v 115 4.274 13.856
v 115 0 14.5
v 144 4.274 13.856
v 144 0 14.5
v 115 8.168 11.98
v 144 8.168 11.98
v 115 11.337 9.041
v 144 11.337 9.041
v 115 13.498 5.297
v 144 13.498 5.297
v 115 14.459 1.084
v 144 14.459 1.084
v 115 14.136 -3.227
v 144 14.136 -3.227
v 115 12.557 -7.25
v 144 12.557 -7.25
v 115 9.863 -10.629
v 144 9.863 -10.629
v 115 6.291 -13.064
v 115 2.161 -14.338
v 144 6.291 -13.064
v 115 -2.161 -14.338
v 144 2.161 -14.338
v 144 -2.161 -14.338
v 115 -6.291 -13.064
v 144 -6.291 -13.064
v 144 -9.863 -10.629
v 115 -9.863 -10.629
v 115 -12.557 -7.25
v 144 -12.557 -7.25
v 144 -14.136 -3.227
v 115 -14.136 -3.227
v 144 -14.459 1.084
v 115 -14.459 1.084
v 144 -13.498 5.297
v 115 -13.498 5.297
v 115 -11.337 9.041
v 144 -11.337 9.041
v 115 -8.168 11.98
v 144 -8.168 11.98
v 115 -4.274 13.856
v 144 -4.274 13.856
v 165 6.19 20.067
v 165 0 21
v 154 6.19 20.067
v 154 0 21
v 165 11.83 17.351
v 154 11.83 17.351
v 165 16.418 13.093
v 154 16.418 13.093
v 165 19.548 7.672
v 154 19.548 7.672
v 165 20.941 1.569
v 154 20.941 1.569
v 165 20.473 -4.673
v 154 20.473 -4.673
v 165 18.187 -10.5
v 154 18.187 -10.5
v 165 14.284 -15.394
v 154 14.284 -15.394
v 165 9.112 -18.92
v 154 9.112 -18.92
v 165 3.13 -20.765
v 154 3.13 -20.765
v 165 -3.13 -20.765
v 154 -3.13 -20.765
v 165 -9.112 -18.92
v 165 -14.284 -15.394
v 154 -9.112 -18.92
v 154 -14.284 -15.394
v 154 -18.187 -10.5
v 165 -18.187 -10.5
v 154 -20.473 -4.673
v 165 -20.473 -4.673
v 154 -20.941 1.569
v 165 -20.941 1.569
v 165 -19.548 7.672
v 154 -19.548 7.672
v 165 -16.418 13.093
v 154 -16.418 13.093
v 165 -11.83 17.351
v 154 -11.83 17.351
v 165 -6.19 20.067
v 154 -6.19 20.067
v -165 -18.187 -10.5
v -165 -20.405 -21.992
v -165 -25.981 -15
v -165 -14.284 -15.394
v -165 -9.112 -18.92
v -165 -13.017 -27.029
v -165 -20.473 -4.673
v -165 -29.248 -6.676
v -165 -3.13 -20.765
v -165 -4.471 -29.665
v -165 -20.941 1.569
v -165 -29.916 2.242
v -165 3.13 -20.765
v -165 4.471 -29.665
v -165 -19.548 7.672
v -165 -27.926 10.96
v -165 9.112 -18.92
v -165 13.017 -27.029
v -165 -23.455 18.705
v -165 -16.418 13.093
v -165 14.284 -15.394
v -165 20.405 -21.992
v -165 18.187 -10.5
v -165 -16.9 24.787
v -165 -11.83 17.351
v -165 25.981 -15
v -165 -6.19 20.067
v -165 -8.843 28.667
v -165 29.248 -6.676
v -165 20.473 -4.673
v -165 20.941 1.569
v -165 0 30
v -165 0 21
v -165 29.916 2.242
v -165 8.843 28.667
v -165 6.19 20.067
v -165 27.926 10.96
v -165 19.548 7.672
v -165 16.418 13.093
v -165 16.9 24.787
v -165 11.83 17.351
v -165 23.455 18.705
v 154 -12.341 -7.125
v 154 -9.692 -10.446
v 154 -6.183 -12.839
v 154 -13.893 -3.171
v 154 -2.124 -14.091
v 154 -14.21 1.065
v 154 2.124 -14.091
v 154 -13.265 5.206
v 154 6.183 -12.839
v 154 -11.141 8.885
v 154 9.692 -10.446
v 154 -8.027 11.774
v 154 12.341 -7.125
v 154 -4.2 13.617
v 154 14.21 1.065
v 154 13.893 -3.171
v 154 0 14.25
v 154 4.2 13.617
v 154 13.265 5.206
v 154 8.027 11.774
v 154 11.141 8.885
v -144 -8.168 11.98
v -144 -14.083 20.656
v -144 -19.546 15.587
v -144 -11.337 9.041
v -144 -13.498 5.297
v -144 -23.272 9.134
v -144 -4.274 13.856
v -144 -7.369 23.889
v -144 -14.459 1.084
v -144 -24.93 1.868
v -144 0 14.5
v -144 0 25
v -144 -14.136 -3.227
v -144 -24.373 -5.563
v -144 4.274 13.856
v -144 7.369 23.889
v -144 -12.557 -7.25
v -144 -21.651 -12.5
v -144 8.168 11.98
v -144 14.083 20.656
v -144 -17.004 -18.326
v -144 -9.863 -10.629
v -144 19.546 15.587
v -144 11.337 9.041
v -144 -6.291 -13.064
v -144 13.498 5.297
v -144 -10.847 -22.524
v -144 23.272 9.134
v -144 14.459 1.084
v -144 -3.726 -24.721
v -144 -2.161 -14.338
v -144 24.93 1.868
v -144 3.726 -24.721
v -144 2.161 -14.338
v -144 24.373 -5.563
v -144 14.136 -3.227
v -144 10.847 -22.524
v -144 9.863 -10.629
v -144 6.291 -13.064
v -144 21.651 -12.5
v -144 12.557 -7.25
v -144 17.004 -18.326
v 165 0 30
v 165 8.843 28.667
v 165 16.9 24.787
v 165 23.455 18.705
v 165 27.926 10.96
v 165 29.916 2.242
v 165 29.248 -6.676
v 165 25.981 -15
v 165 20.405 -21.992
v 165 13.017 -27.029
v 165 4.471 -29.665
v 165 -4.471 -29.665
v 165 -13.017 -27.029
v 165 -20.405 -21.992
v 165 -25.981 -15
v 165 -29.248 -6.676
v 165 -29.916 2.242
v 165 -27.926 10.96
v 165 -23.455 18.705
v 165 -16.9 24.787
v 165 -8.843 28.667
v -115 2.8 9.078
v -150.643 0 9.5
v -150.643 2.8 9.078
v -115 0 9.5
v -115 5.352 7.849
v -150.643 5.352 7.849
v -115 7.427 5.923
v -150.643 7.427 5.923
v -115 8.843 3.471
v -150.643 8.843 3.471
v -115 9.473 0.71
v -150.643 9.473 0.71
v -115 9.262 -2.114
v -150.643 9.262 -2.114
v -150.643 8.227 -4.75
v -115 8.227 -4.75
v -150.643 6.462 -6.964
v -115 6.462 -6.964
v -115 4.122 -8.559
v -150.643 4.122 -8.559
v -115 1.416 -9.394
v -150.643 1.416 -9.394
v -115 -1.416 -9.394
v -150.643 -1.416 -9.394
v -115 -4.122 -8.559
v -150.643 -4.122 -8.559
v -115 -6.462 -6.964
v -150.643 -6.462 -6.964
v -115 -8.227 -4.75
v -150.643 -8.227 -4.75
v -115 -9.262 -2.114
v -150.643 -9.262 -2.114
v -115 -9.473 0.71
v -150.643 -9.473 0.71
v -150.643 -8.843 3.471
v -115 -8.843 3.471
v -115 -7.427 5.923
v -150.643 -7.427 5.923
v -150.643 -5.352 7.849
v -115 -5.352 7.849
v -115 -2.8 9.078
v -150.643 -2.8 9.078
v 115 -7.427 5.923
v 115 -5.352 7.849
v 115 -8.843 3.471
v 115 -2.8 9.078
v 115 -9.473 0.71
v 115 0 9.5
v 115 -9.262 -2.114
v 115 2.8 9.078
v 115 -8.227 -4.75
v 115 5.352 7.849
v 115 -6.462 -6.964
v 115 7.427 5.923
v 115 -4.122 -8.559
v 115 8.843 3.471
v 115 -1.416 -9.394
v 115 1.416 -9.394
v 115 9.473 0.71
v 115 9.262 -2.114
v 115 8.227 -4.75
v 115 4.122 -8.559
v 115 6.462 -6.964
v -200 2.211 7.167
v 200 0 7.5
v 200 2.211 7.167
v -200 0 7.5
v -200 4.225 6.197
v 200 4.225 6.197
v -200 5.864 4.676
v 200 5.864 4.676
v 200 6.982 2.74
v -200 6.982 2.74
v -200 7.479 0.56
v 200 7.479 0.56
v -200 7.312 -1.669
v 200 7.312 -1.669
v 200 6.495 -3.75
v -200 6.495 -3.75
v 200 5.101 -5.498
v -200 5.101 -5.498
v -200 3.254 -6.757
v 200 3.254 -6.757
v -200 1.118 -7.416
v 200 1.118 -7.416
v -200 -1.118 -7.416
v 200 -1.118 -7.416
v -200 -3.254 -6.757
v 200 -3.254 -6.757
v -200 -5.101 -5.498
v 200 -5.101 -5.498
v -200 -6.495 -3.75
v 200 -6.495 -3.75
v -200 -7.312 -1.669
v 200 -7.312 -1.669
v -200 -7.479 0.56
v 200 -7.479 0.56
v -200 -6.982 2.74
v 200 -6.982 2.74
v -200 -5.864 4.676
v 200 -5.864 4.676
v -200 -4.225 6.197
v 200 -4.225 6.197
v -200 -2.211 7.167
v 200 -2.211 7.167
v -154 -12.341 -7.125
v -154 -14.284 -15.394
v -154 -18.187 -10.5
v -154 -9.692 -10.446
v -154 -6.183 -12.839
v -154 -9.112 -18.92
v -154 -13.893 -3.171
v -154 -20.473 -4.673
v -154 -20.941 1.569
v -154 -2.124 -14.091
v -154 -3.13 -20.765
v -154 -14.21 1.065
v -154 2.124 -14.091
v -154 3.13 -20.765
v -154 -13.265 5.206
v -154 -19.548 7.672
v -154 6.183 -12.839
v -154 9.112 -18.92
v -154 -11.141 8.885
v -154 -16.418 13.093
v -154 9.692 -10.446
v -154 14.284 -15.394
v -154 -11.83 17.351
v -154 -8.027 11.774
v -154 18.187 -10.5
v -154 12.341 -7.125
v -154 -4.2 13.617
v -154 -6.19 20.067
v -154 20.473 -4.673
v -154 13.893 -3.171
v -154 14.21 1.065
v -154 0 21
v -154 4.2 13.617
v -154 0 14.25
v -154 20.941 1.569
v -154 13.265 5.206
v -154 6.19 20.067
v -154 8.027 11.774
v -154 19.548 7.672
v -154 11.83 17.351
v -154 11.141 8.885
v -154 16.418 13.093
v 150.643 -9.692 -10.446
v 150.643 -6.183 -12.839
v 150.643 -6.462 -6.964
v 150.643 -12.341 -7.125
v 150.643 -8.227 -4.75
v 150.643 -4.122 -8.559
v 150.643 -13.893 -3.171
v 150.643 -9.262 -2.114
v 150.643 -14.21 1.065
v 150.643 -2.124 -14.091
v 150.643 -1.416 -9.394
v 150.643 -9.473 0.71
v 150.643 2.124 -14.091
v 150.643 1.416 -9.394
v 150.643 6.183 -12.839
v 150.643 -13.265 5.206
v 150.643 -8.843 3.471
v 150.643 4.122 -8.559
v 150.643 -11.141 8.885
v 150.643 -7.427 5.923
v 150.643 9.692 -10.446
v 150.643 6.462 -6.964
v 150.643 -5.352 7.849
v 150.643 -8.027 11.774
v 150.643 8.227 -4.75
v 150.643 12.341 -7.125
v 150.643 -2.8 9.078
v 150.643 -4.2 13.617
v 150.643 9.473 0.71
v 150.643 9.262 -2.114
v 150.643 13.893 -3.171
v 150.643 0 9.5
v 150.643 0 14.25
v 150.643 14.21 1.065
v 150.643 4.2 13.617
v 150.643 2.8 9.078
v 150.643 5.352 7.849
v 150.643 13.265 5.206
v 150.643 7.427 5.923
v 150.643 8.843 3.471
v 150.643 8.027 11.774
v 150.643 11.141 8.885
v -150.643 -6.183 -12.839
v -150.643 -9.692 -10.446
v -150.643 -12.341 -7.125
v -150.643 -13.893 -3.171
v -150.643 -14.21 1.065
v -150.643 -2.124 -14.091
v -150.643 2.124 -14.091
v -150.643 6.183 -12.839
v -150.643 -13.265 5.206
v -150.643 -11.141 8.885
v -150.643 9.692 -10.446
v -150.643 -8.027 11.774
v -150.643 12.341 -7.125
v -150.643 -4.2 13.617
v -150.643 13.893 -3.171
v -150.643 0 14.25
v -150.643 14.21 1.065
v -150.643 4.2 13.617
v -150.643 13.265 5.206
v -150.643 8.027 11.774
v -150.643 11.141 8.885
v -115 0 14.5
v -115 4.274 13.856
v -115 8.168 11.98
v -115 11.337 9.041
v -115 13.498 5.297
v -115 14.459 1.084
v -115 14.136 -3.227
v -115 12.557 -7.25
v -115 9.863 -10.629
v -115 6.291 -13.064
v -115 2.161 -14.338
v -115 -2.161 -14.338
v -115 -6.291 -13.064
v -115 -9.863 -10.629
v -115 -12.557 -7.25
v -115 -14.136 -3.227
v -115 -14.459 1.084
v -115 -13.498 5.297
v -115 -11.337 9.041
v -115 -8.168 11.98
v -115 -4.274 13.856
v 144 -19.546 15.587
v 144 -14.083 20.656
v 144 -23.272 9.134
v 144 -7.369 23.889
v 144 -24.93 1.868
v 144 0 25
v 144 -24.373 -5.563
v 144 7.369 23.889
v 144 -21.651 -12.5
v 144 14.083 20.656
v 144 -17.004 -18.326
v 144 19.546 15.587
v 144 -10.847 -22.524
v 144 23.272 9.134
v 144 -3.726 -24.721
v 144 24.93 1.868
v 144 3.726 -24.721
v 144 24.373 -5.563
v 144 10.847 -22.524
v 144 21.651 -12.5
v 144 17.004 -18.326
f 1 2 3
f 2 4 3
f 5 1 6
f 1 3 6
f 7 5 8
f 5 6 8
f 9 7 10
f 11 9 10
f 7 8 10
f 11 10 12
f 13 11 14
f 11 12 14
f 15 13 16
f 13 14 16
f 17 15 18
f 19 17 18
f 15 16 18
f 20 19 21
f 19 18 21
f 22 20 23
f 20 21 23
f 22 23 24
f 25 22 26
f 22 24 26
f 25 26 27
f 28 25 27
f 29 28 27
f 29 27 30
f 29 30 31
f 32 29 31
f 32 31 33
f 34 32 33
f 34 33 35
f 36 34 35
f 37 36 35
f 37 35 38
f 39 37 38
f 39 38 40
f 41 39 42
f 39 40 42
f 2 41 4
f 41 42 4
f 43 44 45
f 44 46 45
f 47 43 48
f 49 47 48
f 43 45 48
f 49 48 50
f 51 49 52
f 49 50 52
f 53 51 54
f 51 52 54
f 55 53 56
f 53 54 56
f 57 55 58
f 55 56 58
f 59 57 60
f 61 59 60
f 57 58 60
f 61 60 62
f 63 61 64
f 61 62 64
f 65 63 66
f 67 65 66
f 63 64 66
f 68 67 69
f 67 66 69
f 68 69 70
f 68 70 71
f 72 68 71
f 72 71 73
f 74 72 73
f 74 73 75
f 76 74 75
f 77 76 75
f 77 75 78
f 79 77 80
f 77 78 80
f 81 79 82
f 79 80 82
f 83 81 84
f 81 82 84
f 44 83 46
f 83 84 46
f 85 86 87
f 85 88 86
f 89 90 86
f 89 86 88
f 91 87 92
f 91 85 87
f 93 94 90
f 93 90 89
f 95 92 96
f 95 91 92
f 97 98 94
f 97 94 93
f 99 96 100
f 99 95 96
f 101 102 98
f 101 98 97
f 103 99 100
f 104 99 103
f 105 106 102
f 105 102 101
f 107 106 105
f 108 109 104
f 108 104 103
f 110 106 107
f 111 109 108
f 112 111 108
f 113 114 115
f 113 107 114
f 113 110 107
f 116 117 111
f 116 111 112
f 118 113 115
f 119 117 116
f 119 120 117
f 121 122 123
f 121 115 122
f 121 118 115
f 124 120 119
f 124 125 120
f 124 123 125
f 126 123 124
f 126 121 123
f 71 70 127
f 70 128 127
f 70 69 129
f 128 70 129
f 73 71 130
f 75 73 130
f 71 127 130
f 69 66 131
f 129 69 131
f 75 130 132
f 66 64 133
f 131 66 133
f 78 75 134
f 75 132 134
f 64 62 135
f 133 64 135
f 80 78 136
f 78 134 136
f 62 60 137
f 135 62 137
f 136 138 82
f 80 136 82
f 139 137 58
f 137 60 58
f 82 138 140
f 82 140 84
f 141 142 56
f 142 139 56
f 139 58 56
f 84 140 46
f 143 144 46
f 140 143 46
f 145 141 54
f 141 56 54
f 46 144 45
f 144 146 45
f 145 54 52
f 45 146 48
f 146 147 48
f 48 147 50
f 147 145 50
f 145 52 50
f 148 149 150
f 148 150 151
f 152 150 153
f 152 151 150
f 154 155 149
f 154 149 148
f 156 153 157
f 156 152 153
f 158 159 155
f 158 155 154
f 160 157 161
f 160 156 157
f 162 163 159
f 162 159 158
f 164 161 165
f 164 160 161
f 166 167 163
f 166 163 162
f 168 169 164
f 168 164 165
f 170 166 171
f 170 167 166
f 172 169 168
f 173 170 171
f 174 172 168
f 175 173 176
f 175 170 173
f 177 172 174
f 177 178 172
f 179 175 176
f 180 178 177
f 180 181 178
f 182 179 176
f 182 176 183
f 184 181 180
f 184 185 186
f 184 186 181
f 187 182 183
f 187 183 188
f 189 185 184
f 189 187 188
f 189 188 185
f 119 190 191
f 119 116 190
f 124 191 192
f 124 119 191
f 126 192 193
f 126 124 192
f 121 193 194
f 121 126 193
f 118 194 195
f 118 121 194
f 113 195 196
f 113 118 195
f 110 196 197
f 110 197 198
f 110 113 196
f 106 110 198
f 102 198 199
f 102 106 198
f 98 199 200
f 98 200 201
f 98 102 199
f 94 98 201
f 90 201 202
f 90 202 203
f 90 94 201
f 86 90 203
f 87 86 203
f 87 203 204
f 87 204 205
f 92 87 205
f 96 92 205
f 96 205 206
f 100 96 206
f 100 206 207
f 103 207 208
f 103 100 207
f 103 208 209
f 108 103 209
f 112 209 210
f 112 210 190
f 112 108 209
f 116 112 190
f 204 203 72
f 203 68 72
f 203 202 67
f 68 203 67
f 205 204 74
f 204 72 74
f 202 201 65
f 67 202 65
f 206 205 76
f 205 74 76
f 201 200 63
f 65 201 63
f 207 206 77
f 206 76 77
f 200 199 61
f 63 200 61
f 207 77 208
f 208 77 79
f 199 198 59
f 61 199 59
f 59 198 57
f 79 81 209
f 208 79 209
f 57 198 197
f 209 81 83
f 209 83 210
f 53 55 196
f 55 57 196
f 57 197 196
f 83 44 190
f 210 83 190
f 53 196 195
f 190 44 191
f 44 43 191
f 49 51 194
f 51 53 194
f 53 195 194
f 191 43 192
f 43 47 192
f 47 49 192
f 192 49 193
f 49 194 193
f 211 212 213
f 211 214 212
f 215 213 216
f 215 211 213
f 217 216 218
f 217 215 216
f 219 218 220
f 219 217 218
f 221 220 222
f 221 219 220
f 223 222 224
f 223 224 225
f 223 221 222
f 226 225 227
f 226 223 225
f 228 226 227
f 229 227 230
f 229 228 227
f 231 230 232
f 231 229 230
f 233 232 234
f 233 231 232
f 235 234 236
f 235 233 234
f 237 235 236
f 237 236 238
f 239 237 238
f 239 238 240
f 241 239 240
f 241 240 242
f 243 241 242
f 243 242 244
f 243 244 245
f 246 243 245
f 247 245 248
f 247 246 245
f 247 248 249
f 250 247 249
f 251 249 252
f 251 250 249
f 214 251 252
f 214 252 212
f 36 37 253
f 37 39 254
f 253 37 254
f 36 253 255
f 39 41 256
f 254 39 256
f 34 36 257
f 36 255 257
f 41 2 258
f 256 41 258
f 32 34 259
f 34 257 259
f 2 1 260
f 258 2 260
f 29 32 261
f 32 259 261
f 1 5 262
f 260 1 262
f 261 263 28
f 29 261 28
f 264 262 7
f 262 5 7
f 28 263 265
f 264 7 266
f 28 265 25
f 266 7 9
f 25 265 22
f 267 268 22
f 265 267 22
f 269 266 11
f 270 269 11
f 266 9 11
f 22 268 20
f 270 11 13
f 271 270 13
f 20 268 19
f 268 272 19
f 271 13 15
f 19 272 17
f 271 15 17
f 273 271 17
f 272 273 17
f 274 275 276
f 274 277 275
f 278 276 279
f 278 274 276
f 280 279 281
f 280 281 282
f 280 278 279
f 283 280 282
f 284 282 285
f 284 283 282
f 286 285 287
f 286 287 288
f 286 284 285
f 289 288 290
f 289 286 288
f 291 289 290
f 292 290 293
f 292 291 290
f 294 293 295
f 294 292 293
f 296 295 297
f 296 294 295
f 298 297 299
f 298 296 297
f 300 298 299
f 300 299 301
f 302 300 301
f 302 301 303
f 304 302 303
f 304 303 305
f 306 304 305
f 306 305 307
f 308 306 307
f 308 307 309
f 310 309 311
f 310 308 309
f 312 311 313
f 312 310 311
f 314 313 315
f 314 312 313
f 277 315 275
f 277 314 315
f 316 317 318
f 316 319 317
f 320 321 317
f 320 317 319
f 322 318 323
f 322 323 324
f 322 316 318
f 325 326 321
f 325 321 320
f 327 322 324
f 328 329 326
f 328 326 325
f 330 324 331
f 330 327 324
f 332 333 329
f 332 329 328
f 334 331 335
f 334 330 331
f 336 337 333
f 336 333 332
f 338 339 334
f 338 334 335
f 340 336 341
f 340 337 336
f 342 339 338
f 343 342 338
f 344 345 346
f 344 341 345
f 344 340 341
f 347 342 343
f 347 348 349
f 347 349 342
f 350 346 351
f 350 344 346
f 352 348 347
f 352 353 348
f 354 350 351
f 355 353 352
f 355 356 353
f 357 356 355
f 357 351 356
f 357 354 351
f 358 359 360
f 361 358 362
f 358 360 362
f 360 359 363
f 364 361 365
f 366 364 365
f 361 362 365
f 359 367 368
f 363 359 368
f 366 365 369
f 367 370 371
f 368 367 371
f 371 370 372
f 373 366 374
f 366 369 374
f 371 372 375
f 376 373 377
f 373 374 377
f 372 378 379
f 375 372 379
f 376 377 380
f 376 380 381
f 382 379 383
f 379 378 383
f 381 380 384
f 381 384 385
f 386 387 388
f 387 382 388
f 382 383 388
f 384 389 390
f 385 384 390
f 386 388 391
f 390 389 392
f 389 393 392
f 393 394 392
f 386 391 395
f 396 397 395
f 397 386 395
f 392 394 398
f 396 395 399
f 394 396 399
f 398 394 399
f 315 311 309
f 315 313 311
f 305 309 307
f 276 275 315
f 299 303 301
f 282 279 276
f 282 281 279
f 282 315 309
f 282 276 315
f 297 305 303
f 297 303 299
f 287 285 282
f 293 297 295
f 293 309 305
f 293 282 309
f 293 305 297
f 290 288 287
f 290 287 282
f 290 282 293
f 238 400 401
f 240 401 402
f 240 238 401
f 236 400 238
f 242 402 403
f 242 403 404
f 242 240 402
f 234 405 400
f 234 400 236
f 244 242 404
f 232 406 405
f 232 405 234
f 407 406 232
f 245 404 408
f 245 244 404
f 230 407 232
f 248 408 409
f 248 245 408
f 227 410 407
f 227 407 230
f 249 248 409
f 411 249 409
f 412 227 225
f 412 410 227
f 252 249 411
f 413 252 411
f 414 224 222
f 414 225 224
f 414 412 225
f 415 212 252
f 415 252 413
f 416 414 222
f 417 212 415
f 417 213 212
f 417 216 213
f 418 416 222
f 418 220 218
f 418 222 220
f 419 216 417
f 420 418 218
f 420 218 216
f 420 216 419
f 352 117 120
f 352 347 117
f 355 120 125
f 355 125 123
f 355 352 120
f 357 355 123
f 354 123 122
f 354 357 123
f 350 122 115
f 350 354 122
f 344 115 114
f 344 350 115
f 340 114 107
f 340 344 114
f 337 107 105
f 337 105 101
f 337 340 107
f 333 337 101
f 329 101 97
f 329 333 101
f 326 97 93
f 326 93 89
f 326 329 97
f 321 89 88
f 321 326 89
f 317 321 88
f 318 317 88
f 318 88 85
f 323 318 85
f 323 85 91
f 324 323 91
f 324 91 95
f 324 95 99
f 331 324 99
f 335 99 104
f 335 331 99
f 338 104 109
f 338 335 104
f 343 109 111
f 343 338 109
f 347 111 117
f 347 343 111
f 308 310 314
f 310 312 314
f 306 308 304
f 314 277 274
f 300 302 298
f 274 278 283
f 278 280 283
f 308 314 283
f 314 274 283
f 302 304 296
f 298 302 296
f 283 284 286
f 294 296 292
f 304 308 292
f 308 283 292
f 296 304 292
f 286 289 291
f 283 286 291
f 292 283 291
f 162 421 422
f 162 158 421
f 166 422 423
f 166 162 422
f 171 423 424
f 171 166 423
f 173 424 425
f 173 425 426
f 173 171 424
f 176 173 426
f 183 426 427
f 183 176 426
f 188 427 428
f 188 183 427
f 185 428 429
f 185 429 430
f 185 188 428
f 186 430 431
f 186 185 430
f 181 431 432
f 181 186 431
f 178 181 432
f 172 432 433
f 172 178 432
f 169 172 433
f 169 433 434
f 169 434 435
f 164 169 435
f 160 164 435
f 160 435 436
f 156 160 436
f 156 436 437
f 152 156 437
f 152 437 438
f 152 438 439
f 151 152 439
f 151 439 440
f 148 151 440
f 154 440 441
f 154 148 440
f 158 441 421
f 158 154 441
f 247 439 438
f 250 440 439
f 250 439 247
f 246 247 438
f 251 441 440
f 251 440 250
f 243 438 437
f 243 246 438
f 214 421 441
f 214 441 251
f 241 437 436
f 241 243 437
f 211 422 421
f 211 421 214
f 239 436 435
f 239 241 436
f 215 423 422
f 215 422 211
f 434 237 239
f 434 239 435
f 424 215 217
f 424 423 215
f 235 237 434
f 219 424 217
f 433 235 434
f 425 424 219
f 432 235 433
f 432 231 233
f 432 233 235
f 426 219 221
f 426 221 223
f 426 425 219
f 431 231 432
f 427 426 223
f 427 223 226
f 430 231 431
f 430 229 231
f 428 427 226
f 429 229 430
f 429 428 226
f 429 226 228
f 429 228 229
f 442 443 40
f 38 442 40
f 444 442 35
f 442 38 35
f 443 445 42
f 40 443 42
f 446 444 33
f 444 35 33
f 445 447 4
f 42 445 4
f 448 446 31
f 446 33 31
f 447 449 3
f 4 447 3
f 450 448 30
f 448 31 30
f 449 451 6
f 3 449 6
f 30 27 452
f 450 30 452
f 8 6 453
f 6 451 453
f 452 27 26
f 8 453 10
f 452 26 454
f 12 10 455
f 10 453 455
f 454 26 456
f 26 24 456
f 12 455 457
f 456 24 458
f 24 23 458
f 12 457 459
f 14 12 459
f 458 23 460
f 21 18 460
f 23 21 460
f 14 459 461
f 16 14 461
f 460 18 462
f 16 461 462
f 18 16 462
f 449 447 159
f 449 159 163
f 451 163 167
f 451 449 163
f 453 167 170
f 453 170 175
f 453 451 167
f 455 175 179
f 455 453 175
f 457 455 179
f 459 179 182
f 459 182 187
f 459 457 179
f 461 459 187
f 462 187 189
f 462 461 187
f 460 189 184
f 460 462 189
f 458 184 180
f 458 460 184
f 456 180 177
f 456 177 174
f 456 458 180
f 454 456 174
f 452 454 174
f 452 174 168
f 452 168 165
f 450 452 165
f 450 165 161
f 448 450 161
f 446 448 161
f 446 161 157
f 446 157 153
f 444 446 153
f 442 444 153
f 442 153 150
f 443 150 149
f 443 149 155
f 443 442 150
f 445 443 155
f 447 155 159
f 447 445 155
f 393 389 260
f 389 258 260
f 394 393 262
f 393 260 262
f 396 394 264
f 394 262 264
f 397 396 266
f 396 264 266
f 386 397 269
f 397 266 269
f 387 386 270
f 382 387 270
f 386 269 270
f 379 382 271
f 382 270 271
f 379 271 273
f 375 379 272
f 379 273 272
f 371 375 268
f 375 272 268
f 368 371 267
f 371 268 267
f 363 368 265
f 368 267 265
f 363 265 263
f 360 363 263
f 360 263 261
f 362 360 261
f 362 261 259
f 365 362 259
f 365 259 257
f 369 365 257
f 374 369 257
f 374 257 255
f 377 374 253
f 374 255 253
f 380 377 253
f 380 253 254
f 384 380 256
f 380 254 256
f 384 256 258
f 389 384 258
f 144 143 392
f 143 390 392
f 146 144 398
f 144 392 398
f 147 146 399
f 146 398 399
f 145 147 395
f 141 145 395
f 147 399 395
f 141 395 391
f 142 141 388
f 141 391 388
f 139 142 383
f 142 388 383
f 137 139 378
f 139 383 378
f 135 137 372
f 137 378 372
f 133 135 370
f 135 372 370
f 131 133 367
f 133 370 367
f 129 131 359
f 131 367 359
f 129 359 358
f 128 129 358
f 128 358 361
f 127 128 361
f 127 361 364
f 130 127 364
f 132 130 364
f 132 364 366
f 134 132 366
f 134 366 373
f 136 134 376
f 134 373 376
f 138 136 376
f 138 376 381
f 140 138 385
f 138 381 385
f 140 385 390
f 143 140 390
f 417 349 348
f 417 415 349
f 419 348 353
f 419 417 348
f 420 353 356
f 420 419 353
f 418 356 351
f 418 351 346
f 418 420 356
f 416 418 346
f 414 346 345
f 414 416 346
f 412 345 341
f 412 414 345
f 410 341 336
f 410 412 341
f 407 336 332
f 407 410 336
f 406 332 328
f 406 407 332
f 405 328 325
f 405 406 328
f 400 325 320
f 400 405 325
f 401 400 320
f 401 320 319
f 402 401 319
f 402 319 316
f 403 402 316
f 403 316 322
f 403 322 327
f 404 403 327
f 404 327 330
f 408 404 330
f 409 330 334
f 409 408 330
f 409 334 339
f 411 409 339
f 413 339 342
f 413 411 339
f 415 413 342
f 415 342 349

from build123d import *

# Parameters (mm, degrees)
F0_W   = 315.643
F0_H   = 7.5
F0_W_2 = 11
F0_W_3 = 3.357
F0_W_4 = 35


# Not quite as in the source:
# - a pattern or mirror of a feature is missing from the dataset's text; its kind, count and spacing are read off the source's solid


with BuildPart() as f1:
    # F0 (on Front) → F1 (revolve)
    with BuildSketch(Plane.XZ):
        Polygon((-144, 25), (165, 25), (165, 30), (-165, 30), (-165, 25), align=None)
    revolve(axis=Axis((0, 0, 0), (-1, 0, 0)))

    # F0 (on Front) → F2 (revolve)
    with BuildSketch(Plane.XZ):
        Polygon((-144, 14.5), (-144, 25), (-165, 25), (-165, 21), (-154, 21), (-154, 14.25), (-150.643, 14.25), (-150.643, 9.5), (-115, 9.5), (-115, 14.5), align=None)
    f2 = revolve(axis=Axis((0, 0, 0), (-1, 0, 0)))

    # F2_copies: F2 across plane
    add(f2.mirror(Plane(origin=(0, 0, 0), x_dir=(0, 0, 1), z_dir=(1, 0, 0))))


with BuildPart() as f3:
    # F0 (on Front) → F3 (revolve)
    with BuildSketch(Plane.XZ):
        with Locations((7.1785, 3.75)):
            Rectangle(F0_W, F0_H)
        with Locations((-159.5, 3.75)):
            Rectangle(F0_W_2, F0_H)
        with Locations((-152.3215, 3.75)):
            Rectangle(F0_W_3, F0_H)
        with Locations((-182.5, 3.75)):
            Rectangle(F0_W_4, F0_H)
        with Locations((182.5, 3.75)):
            Rectangle(F0_W_4, F0_H)
    revolve(axis=Axis((0, 0, 0), (-1, 0, 0)))


solid = Compound([f1.part, f3.part])
